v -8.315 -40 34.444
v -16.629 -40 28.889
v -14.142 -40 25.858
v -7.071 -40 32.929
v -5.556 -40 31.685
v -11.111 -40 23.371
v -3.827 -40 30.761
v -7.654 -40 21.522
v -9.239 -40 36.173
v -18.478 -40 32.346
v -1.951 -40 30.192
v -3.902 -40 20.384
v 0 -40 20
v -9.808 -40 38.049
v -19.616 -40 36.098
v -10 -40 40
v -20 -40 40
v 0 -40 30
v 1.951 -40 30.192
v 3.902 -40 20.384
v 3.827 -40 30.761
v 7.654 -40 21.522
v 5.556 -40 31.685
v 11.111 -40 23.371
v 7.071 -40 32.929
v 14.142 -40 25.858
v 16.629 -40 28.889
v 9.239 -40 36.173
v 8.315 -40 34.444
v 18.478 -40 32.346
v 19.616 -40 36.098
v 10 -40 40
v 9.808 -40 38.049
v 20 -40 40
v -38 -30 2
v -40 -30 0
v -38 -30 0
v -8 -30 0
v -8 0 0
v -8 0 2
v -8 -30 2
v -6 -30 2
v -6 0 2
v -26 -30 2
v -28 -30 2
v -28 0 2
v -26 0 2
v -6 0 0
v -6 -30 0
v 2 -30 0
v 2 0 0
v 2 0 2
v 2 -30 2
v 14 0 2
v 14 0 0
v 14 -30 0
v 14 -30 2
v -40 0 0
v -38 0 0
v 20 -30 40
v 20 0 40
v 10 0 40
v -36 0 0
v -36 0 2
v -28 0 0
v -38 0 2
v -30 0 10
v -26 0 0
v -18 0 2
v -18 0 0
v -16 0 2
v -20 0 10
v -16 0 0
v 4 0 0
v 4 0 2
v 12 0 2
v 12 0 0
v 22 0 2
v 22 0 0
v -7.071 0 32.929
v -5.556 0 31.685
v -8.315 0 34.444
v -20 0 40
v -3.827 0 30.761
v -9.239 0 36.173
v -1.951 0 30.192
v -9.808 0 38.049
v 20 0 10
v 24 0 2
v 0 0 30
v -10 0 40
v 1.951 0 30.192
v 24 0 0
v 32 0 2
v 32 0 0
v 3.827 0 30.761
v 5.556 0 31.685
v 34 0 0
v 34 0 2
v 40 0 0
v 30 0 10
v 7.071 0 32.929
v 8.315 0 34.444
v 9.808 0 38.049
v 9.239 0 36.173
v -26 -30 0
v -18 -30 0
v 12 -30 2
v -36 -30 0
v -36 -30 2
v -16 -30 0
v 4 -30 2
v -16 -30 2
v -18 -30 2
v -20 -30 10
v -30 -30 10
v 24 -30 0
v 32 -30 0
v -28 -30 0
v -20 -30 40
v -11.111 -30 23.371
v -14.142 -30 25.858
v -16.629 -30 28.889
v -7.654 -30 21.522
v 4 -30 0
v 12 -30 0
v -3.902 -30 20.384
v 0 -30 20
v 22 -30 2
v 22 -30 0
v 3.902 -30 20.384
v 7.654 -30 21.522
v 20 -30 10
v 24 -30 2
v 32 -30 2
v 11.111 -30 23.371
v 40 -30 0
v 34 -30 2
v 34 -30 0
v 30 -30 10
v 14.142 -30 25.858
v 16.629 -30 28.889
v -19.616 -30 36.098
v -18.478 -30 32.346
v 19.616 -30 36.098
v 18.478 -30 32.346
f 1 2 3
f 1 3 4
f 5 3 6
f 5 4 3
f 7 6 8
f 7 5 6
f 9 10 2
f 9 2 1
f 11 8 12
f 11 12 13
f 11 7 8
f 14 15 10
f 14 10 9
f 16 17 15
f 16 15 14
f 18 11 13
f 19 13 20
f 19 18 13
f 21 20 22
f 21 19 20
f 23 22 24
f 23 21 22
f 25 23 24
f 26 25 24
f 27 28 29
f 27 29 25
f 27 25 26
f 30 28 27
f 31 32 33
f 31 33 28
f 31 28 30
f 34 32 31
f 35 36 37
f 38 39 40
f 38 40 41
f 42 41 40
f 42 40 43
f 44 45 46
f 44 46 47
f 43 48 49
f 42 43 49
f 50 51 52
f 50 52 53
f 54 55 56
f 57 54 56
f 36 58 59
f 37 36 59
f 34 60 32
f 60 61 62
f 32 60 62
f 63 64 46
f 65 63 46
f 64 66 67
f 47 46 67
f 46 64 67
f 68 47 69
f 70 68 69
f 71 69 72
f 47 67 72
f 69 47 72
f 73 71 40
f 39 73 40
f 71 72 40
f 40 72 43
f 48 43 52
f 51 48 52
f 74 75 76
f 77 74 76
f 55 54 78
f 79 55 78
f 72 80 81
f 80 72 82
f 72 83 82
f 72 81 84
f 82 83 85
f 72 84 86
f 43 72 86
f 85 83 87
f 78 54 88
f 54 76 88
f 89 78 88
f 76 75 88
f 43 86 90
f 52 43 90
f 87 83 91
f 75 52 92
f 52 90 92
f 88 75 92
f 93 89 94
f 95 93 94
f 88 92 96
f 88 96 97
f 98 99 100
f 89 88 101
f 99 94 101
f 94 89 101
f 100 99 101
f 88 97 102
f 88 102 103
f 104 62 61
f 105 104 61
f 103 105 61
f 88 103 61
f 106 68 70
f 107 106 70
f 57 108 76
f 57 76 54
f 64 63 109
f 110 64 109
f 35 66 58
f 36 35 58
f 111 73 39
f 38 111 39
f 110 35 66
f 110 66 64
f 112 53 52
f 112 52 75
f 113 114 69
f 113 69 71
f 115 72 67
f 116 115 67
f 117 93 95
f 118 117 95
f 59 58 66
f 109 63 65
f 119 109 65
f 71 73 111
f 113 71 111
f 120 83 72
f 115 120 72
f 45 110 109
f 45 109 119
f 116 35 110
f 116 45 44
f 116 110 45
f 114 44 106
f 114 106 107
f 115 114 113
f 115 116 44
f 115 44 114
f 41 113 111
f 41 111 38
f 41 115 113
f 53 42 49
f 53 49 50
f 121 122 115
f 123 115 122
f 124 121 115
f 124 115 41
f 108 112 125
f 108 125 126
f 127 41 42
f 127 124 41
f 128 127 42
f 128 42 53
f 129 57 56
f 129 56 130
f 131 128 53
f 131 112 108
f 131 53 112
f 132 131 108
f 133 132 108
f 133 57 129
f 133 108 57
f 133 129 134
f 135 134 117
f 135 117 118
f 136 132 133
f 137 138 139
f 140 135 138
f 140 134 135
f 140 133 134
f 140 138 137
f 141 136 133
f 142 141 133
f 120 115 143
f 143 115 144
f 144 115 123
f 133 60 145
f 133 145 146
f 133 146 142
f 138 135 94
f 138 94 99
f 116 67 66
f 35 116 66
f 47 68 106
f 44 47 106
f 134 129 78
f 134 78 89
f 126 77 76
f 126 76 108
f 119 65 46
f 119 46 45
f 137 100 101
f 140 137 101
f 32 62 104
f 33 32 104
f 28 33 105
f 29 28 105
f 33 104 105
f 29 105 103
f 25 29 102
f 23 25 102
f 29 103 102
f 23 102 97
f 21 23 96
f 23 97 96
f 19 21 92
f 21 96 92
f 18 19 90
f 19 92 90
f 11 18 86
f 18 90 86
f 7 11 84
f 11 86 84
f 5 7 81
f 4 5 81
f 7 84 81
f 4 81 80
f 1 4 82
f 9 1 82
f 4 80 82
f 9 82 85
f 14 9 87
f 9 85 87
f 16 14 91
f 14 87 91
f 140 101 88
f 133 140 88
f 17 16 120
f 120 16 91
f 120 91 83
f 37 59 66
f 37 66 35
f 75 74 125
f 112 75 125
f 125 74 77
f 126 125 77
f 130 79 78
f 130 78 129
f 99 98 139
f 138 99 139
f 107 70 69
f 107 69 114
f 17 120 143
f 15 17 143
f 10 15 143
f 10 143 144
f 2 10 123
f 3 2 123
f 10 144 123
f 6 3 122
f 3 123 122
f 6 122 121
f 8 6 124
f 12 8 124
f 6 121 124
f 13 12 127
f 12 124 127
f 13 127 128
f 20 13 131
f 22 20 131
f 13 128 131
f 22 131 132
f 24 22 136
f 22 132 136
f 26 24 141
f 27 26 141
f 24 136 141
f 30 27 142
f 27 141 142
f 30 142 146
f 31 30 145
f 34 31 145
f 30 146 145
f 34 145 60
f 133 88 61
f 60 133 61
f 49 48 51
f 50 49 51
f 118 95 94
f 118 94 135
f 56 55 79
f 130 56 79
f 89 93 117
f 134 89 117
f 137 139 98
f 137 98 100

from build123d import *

# Parameters (mm, degrees)
F1_DEPTH = 30
F3_DEPTH = 10
F4_W     = 2
F4_H     = 30
F5_DEPTH = 2


with BuildPart() as f1:
    # F0 (on Front) → F1 (new body)
    with BuildSketch(Plane.XZ):
        with BuildLine():
            Line((-30, 10), (-40, 0))
            Line((-40, 0), (40, 0))
            Line((40, 0), (30, 10))
            Line((30, 10), (20, 10))
            Line((20, 10), (20, 40))
            Line((20, 40), (10, 40))
            ThreePointArc((10, 40), (0, 30), (-10, 40))
            Line((-10, 40), (-20, 40))
            Line((-20, 40), (-20, 10))
            Line((-20, 10), (-30, 10))
        make_face()
    extrude(amount=F1_DEPTH)

    # F2 (on face) → F3 (join)
    with BuildSketch(Plane.XZ.offset(30)):
        with BuildLine():
            Line((-10, 40), (-20, 40))
            ThreePointArc((-20, 40), (0, 20), (20, 40))
            Line((20, 40), (10, 40))
            ThreePointArc((10, 40), (0, 30), (-10, 40))
        make_face()
    extrude(amount=F3_DEPTH)

    # F4 (on face) → F5 (cut)
    with BuildSketch(Plane(origin=(0, 0, 0), x_dir=(1, 0, 0), z_dir=(0, 0, -1))):
        with Locations((-27, 15)):
            Rectangle(F4_W, F4_H)
        with Locations((-37, 15)):
            Rectangle(F4_W, F4_H)
        with Locations((-17, 15)):
            Rectangle(F4_W, F4_H)
        with Locations((-7, 15)):
            Rectangle(F4_W, F4_H)
        with Locations((3, 15)):
            Rectangle(F4_W, F4_H)
        with Locations((13, 15)):
            Rectangle(F4_W, F4_H)
        with Locations((23, 15)):
            Rectangle(F4_W, F4_H)
        with Locations((33, 15)):
            Rectangle(F4_W, F4_H)
    extrude(amount=-F5_DEPTH, mode=Mode.SUBTRACT)


solid = f1.part
